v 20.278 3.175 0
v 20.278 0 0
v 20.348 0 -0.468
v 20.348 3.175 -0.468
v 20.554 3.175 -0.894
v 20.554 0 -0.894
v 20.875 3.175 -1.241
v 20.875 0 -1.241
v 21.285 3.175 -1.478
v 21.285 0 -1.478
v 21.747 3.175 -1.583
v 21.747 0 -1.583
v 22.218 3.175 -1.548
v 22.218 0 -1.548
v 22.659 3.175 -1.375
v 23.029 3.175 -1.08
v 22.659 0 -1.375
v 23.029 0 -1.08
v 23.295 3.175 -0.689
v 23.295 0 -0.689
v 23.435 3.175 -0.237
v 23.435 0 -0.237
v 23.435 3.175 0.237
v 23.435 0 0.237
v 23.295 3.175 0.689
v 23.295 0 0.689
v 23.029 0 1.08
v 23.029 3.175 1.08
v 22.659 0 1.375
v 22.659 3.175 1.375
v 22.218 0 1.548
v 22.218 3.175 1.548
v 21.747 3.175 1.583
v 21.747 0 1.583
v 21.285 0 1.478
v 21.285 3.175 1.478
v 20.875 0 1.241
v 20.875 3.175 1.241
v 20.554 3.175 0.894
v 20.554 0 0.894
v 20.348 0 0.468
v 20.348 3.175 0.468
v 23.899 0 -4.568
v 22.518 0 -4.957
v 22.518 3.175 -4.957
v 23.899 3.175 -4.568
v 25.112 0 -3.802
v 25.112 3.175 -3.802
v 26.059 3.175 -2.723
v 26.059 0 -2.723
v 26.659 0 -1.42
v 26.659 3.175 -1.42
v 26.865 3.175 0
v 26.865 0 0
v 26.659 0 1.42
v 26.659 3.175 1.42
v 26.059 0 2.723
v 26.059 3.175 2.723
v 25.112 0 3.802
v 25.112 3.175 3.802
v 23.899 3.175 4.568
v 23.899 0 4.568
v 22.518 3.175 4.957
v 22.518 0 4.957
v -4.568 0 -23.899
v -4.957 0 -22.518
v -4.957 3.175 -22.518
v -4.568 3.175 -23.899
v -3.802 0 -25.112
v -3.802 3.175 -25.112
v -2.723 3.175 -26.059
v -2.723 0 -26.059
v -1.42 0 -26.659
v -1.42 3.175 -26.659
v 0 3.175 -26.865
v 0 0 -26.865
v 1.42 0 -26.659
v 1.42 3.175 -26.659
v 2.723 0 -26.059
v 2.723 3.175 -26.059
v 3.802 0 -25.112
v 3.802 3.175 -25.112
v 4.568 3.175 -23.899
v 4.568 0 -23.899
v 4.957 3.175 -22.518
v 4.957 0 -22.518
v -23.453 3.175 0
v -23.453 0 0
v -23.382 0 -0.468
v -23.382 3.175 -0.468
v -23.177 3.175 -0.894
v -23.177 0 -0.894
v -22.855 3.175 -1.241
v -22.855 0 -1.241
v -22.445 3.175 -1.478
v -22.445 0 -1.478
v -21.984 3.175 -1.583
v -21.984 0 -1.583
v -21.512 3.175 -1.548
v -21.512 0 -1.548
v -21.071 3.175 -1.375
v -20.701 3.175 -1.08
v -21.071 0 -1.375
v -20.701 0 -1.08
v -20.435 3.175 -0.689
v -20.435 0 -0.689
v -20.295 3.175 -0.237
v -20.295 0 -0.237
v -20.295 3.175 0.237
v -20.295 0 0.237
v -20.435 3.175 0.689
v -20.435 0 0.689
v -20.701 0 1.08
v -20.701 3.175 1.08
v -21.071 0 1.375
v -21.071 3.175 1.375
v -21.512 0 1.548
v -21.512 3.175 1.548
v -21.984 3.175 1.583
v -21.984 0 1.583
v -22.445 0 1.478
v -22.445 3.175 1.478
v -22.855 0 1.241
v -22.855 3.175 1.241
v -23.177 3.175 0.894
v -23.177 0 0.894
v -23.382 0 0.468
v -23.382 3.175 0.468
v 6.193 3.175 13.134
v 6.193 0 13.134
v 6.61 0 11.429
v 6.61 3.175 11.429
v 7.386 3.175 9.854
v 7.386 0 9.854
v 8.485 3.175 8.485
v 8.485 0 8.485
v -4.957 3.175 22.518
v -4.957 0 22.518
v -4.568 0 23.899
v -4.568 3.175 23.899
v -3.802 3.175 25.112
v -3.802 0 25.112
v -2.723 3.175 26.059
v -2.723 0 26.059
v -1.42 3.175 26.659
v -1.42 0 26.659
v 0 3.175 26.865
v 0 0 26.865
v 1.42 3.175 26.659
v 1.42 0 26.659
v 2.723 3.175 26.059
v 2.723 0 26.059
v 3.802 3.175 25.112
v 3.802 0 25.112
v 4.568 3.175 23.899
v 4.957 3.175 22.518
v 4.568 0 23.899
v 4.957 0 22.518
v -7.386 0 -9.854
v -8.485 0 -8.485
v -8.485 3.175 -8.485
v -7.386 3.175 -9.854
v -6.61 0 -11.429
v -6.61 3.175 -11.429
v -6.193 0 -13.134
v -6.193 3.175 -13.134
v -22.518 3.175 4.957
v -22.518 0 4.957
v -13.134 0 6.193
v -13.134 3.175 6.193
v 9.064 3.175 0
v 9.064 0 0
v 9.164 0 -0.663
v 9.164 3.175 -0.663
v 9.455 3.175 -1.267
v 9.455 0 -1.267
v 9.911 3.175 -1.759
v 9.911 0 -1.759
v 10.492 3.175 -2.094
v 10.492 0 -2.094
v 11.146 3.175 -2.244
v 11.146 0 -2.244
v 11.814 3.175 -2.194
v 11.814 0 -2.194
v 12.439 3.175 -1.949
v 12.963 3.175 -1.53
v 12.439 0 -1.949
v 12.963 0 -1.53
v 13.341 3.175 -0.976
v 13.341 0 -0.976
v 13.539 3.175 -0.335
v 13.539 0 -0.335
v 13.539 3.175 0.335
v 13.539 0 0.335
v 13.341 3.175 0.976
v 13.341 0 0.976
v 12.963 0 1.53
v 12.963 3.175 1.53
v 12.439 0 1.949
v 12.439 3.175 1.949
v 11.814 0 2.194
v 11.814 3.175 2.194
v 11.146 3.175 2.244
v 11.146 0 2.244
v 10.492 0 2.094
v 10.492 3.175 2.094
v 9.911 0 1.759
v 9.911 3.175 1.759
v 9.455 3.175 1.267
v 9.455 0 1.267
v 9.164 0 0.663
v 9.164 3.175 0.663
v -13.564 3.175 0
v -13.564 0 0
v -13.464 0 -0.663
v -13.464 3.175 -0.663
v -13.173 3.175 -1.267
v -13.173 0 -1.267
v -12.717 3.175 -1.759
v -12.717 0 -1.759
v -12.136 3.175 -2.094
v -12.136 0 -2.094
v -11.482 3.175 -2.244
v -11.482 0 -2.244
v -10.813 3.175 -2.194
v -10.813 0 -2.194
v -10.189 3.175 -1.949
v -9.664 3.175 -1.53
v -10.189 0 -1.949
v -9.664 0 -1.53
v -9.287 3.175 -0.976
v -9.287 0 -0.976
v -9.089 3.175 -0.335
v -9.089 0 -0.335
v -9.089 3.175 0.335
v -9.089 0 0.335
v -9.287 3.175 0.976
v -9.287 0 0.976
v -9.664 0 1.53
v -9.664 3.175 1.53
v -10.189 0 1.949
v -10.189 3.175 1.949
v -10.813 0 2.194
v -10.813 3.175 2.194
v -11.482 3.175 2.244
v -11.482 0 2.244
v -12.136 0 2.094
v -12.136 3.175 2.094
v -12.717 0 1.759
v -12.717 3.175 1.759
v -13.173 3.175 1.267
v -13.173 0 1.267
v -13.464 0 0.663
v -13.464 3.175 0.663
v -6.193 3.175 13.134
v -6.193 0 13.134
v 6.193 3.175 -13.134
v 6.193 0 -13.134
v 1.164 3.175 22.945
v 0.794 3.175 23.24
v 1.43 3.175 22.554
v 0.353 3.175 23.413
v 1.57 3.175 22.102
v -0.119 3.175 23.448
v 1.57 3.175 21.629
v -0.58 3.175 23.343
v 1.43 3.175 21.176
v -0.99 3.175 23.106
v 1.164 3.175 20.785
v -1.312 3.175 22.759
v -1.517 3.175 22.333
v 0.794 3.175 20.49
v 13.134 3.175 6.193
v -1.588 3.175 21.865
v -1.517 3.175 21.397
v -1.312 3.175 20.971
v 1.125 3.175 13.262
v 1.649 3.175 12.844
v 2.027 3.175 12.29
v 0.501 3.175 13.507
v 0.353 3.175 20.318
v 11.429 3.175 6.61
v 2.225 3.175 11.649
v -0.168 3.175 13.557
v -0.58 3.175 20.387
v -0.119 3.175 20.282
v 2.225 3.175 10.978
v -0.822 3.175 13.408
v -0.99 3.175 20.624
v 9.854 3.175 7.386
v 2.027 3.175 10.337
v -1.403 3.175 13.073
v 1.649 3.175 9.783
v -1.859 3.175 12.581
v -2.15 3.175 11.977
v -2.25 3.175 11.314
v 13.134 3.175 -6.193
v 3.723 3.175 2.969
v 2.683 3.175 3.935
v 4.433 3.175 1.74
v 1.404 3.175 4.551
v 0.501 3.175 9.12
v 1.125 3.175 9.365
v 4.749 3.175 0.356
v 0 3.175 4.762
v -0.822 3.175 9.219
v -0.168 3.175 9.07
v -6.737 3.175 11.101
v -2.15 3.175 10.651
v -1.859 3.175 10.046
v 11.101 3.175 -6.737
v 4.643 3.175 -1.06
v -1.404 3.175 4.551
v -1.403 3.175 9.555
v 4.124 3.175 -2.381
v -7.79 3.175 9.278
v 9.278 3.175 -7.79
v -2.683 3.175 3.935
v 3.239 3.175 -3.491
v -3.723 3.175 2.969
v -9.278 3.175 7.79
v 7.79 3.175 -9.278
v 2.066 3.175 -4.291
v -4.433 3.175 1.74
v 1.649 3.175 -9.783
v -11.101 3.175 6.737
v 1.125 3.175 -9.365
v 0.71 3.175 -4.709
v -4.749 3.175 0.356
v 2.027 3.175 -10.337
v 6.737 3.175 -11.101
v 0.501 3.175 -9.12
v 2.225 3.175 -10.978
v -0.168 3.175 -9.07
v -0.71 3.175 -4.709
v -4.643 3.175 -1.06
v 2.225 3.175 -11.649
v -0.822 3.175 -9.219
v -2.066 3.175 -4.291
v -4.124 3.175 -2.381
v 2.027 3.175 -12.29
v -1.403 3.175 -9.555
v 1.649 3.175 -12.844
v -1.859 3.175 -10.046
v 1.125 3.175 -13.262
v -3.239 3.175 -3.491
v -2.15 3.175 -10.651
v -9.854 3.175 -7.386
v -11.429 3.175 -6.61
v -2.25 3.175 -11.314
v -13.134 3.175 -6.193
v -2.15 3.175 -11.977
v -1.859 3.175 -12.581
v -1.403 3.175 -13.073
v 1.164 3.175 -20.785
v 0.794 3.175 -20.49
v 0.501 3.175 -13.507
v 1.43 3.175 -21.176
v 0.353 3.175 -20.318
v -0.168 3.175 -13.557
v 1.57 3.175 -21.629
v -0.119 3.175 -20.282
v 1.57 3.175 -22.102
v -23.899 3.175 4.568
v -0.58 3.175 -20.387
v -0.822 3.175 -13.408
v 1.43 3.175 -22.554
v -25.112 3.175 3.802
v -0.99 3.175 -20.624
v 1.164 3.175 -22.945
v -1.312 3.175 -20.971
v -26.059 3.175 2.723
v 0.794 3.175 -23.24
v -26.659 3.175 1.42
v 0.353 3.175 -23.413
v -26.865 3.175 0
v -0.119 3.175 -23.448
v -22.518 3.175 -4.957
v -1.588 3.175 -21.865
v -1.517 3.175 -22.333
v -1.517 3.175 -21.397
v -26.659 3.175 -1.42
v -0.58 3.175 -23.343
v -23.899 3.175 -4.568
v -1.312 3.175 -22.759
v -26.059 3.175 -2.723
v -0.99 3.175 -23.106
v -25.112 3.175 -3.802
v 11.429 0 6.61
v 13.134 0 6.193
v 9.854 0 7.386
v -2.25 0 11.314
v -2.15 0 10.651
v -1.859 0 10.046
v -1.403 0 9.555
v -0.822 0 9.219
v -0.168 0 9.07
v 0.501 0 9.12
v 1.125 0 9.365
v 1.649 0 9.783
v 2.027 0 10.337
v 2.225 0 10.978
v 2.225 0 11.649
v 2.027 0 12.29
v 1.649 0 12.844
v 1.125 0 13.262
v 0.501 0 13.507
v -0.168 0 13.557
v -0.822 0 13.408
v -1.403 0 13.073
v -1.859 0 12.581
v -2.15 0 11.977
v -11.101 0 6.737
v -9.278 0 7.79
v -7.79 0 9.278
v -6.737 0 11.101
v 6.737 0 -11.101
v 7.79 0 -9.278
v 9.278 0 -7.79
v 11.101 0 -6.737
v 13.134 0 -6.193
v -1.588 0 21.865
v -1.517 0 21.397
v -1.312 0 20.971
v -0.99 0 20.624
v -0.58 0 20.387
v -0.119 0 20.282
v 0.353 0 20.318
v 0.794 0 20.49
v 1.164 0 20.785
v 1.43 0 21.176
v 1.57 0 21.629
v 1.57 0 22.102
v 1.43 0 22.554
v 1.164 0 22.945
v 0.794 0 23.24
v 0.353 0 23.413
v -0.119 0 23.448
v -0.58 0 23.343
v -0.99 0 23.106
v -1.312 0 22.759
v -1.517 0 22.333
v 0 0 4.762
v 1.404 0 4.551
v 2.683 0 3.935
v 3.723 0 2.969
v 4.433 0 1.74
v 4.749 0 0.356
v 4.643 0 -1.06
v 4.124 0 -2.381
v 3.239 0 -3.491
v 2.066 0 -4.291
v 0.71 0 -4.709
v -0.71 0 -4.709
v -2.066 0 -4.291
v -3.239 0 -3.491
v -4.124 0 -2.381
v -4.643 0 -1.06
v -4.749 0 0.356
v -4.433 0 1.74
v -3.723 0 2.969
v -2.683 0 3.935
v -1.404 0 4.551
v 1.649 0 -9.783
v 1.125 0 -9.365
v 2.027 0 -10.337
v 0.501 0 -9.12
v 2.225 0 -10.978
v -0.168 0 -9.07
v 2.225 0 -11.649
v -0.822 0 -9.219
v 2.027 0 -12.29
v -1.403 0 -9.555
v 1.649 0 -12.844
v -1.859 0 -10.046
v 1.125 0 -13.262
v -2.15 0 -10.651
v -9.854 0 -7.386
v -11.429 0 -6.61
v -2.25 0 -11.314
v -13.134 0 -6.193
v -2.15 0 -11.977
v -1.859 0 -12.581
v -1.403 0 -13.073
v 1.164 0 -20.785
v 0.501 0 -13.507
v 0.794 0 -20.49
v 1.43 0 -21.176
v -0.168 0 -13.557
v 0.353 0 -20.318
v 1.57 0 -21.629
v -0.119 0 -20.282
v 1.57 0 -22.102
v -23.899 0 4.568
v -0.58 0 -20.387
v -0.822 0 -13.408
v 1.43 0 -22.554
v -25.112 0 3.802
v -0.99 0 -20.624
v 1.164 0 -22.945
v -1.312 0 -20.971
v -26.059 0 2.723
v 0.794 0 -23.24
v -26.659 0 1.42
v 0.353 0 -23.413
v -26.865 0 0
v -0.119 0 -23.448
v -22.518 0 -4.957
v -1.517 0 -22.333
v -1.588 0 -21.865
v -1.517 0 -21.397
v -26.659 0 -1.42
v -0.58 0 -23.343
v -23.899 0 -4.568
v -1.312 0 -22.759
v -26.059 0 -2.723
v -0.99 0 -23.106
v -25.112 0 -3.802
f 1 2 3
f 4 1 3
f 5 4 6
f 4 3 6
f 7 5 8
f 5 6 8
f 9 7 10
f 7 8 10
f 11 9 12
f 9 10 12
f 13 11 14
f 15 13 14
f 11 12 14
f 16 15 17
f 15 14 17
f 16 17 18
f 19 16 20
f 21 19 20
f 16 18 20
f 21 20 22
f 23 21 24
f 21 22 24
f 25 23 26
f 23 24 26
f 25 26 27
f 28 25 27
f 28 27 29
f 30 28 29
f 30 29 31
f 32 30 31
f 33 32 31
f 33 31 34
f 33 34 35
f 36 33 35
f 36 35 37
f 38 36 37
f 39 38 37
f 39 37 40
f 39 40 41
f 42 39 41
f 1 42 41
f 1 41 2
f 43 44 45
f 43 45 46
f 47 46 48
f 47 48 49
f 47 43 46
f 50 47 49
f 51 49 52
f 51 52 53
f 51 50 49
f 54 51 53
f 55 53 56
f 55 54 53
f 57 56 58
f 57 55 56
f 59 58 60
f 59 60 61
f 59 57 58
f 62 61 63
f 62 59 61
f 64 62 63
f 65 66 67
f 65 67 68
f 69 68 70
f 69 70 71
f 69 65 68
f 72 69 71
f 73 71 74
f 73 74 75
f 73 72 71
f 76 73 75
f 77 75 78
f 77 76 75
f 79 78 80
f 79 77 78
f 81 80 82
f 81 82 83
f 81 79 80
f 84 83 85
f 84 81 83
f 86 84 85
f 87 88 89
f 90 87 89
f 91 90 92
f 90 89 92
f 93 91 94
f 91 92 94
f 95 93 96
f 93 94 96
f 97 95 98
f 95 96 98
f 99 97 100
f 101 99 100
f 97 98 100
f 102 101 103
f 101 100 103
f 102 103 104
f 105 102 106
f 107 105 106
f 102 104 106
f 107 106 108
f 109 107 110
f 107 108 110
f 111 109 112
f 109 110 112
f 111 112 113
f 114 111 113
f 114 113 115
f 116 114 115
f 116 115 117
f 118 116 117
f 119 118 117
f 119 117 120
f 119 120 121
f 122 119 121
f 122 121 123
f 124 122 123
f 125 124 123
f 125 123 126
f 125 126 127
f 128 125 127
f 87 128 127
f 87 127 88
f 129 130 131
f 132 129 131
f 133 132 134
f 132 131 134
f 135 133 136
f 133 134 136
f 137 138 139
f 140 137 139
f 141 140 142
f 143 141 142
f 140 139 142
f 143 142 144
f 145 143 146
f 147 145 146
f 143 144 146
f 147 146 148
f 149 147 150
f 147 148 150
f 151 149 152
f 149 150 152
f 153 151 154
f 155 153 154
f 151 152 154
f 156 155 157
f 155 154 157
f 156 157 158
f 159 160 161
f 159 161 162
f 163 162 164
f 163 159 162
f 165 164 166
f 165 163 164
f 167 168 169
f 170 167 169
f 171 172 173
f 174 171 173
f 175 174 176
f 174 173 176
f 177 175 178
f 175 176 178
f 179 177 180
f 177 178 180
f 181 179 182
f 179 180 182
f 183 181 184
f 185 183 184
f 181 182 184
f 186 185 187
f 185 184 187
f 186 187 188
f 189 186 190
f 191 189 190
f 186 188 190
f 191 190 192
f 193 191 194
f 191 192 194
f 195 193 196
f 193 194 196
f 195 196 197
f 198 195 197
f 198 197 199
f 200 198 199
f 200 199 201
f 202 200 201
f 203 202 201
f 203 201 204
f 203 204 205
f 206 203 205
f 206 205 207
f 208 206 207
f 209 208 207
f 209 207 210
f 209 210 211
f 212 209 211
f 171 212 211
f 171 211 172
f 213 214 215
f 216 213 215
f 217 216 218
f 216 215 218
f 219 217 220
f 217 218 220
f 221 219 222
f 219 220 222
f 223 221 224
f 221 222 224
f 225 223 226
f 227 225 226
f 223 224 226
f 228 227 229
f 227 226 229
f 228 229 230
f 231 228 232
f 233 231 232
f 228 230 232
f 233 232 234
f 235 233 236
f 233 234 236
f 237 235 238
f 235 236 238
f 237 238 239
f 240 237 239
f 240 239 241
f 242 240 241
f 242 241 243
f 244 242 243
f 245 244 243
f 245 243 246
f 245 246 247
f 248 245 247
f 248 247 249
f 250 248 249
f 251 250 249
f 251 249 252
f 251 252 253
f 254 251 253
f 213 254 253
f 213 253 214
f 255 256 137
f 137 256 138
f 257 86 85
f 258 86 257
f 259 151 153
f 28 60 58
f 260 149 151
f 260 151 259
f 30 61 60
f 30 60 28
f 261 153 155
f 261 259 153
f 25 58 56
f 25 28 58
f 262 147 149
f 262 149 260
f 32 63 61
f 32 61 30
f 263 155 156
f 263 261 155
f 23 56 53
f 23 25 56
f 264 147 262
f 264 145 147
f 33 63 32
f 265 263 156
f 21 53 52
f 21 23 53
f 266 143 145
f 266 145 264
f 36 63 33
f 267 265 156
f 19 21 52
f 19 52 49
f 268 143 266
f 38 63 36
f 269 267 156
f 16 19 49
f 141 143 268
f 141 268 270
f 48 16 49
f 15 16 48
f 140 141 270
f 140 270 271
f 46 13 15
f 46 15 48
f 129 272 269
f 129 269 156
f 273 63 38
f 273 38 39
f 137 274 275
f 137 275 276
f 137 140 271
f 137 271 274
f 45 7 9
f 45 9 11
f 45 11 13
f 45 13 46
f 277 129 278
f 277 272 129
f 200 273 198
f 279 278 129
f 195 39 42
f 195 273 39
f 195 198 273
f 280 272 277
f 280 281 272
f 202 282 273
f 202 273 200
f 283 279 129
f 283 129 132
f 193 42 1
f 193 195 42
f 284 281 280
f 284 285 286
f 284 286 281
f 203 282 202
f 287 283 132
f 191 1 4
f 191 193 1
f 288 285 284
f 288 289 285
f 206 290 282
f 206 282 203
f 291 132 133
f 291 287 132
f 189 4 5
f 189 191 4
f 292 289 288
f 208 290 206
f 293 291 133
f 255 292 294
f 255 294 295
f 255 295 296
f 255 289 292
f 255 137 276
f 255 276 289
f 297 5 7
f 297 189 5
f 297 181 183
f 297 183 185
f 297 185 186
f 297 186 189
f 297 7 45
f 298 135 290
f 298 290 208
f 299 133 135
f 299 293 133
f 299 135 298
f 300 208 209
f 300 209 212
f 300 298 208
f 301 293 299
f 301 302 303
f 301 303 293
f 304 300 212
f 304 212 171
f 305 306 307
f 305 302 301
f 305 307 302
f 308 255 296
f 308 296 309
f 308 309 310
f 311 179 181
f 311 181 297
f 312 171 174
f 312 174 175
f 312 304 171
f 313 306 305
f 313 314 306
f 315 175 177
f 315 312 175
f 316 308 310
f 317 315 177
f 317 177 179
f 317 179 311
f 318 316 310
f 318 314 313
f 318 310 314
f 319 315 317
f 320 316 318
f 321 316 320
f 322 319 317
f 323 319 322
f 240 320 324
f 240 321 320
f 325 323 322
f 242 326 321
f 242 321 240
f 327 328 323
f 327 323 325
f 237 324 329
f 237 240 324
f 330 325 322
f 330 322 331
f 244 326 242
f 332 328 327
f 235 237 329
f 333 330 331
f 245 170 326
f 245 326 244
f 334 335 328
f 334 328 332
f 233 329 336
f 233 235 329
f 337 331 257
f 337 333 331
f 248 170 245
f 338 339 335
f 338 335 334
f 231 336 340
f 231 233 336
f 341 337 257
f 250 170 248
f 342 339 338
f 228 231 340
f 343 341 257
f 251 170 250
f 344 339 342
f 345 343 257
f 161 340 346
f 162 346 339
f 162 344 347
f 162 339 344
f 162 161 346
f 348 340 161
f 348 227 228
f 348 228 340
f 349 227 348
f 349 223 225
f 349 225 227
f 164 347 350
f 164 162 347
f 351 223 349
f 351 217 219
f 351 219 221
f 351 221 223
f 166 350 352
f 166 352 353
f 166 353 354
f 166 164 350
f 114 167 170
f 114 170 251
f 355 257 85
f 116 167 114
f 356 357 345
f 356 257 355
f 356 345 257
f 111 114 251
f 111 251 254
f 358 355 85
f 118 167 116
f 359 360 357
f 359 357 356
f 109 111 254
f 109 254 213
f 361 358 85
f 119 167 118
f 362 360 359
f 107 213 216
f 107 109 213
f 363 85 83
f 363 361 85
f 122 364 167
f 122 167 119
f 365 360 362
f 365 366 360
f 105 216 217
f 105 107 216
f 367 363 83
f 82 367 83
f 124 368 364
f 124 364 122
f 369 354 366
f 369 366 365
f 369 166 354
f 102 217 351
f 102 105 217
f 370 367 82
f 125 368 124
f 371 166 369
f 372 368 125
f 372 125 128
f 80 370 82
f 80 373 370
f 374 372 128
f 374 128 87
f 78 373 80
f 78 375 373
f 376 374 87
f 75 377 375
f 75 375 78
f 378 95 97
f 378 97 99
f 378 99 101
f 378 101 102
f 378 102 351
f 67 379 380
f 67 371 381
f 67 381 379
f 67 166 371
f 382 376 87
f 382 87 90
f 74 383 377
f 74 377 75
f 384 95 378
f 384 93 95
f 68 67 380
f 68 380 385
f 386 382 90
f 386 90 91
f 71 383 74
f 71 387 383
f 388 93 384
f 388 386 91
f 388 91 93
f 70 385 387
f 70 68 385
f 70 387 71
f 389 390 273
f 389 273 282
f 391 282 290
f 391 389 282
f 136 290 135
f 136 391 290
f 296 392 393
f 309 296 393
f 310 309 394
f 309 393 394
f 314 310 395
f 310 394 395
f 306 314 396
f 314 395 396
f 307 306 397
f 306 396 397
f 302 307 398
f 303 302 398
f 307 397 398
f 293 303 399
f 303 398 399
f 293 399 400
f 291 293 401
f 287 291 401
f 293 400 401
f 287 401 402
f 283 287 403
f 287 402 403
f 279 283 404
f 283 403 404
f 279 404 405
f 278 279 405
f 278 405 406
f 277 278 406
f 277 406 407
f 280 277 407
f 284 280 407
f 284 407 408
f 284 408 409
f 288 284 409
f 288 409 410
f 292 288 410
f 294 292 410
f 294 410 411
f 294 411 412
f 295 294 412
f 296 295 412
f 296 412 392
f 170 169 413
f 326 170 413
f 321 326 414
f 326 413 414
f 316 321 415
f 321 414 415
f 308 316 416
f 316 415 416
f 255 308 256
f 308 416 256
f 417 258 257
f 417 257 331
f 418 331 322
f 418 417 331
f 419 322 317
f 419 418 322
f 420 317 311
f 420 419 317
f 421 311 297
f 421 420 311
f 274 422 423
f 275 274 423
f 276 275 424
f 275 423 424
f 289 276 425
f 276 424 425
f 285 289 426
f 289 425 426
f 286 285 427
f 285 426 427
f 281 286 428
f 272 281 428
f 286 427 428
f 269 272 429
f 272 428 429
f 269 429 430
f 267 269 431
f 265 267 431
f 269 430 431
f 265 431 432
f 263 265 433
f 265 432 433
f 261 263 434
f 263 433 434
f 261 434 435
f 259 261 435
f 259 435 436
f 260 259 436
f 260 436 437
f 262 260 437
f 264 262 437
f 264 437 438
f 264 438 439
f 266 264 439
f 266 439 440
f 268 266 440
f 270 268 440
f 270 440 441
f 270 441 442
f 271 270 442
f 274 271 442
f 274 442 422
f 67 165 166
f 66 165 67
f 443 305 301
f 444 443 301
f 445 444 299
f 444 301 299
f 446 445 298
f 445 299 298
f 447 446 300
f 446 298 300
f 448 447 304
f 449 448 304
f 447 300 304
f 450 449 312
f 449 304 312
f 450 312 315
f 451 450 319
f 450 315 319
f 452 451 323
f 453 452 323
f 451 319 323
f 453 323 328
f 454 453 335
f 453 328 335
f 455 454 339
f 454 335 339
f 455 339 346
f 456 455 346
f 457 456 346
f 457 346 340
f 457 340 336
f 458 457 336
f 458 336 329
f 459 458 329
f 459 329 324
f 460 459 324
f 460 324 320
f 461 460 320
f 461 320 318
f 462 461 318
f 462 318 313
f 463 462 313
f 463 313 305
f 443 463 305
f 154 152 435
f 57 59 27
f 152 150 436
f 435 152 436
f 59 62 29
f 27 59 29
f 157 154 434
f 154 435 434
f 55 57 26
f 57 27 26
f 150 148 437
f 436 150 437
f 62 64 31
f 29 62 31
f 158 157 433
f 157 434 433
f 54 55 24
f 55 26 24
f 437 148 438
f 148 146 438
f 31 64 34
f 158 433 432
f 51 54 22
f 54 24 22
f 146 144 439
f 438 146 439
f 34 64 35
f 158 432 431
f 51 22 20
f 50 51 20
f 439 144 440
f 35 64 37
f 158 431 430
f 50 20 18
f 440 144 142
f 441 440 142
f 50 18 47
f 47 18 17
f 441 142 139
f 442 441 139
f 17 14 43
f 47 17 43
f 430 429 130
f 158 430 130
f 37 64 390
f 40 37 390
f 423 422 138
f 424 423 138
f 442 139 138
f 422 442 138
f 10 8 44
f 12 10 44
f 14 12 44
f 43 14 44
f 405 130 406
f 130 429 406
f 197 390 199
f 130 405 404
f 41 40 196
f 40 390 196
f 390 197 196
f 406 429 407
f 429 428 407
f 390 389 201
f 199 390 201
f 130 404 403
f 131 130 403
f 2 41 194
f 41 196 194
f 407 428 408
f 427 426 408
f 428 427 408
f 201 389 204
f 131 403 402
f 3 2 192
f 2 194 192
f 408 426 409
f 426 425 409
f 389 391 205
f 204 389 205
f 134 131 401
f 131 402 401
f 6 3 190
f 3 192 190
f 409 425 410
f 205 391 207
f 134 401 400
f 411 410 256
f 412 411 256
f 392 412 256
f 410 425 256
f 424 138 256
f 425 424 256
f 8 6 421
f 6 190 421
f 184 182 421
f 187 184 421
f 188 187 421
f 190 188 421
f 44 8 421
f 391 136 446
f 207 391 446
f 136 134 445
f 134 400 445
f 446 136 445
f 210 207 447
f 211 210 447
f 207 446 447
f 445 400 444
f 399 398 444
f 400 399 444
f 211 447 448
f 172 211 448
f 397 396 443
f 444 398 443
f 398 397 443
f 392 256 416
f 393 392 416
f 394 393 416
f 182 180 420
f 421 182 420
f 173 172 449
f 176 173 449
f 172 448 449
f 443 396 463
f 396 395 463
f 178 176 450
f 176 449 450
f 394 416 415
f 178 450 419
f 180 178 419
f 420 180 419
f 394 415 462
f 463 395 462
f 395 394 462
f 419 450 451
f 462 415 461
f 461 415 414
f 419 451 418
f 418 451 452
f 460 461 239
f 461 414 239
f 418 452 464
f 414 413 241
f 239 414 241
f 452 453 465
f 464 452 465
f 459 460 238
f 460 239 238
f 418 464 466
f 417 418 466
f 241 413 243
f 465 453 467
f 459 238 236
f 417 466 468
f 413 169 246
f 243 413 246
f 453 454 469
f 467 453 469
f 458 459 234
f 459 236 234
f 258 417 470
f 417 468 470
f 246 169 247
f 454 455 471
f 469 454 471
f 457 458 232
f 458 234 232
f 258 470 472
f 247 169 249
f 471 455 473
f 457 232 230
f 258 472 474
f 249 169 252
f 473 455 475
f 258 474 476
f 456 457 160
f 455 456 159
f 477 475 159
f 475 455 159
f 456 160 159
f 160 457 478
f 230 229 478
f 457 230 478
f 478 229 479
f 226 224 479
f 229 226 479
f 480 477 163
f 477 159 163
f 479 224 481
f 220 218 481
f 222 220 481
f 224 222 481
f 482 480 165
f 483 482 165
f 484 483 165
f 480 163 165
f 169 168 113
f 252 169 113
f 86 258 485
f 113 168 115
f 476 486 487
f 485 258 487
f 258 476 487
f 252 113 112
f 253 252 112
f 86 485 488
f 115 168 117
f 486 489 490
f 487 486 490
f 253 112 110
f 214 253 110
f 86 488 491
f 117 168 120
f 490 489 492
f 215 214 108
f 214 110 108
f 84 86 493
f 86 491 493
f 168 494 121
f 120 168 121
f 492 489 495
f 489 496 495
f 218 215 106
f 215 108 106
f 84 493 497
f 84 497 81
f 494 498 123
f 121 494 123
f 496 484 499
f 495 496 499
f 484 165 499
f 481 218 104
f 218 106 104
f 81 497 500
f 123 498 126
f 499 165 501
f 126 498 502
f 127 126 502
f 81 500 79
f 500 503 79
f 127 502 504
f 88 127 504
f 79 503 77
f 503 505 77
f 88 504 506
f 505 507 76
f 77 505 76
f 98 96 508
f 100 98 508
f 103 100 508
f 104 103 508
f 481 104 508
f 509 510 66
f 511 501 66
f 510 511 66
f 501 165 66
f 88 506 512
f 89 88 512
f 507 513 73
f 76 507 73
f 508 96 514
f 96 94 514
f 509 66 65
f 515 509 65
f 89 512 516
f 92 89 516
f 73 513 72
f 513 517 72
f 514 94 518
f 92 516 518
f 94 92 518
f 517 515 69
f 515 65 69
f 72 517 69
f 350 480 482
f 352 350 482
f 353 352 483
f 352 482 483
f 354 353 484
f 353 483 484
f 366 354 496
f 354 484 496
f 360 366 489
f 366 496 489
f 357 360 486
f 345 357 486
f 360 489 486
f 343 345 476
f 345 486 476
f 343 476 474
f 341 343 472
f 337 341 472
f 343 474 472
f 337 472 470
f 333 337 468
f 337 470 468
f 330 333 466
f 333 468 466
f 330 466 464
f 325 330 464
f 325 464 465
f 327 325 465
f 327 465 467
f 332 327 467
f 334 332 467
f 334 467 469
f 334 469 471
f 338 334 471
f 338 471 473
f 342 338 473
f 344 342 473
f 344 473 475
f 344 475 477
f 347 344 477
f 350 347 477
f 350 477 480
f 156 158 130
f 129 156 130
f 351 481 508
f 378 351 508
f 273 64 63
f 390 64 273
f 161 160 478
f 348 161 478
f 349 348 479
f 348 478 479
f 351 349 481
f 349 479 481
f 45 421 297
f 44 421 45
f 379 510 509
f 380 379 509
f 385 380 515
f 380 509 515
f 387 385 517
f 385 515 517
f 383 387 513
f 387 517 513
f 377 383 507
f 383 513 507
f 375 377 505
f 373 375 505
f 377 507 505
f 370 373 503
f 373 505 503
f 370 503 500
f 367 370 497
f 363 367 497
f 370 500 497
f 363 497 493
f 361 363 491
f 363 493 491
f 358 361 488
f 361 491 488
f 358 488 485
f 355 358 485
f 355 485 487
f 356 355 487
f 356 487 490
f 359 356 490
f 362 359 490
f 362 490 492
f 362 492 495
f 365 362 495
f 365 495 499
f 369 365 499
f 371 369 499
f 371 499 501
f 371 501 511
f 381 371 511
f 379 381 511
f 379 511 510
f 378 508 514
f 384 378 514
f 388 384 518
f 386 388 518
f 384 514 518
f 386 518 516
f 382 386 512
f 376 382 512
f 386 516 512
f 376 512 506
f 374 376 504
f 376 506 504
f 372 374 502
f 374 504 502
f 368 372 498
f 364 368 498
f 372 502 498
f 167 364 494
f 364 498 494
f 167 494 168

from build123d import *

# Parameters (mm, degrees)
BOSS_EXTRUDE1_DEPTH        = 3.175
F_1_8_0_1250_DOWEL_HOLE1_D = 3.175
SKETCH4_R                  = 4.7625
CUT_EXTRUDE1_DEPTH         = 39.125563171
M4_CLEARANCE_HOLE1_D       = 4.5


with BuildPart() as part:
    # Sketch1 → Boss-Extrude1 (new body)
    with BuildSketch(Plane(origin=(0, 0, 0), x_dir=(1, 0, 0), z_dir=(0, 1, 0))):
        with BuildLine():
            Line((4.957224307, 22.517830961), (6.192571563, 13.134436958))
            ThreePointArc((6.192571563, 13.134436958), (8.485281374, 8.485281374), (13.134436958, 6.192571563))
            Line((13.134436958, 6.192571563), (22.517830961, 4.957224307))
            ThreePointArc((22.517830961, 4.957224307), (26.8652, 0), (22.517830961, -4.957224307))
            Line((22.517830961, -4.957224307), (13.134436958, -6.192571563))
            ThreePointArc((13.134436958, -6.192571563), (10.620595205, -6.955137122), (8.485281374, -8.485281374))
            Line((8.485281374, -8.485281374), (-8.485281374, 8.485281374))
            ThreePointArc((-8.485281374, 8.485281374), (-6.955137122, 10.620595205), (-6.192571563, 13.134436958))
            Line((-6.192571563, 13.134436958), (-4.957224307, 22.517830961))
            ThreePointArc((-4.957224307, 22.517830961), (0, 26.8652), (4.957224307, 22.517830961))
        make_face()
    boss_extrude1 = extrude(amount=BOSS_EXTRUDE1_DEPTH)

    # Mirror7: Boss-Extrude1 across plane
    add(boss_extrude1.mirror(Plane(origin=(-8.485281374, 3.175, -8.485281374), x_dir=(0.7071067811865467, 0, 0.7071067811865483), z_dir=(0.7071067811865486, 0, -0.7071067811865466))))

    # 1/8 (0.1250) Dowel Hole1 (through all)
    with Locations(Plane(origin=(0, 3.175, 0), x_dir=(1, 0, 0), z_dir=(0, 1, 0))):
        with Locations((0, 21.8652), (0, -21.8652), (-21.8652, 0), (21.8652, 0)):
            Hole(F_1_8_0_1250_DOWEL_HOLE1_D / 2)

    # Sketch4 → Cut-Extrude1 (cut, through all)
    with BuildSketch(Plane(origin=(0, 3.175, 0), x_dir=(1, 0, 0), z_dir=(0, 1, 0))):
        with Locations(Location((0, 0, 0), (0, 0, 270))):
            Circle(SKETCH4_R)
    extrude(amount=-CUT_EXTRUDE1_DEPTH, mode=Mode.SUBTRACT)

    # M4 Clearance Hole1 (through all)
    with Locations(Plane(origin=(0, 3.175, 0), x_dir=(1, 0, 0), z_dir=(0, 1, 0))):
        with Locations((-11.313708499, 0), (0, 11.313708499), (11.313708499, 0), (0, -11.313708499)):
            Hole(M4_CLEARANCE_HOLE1_D / 2)


solid = part.part
